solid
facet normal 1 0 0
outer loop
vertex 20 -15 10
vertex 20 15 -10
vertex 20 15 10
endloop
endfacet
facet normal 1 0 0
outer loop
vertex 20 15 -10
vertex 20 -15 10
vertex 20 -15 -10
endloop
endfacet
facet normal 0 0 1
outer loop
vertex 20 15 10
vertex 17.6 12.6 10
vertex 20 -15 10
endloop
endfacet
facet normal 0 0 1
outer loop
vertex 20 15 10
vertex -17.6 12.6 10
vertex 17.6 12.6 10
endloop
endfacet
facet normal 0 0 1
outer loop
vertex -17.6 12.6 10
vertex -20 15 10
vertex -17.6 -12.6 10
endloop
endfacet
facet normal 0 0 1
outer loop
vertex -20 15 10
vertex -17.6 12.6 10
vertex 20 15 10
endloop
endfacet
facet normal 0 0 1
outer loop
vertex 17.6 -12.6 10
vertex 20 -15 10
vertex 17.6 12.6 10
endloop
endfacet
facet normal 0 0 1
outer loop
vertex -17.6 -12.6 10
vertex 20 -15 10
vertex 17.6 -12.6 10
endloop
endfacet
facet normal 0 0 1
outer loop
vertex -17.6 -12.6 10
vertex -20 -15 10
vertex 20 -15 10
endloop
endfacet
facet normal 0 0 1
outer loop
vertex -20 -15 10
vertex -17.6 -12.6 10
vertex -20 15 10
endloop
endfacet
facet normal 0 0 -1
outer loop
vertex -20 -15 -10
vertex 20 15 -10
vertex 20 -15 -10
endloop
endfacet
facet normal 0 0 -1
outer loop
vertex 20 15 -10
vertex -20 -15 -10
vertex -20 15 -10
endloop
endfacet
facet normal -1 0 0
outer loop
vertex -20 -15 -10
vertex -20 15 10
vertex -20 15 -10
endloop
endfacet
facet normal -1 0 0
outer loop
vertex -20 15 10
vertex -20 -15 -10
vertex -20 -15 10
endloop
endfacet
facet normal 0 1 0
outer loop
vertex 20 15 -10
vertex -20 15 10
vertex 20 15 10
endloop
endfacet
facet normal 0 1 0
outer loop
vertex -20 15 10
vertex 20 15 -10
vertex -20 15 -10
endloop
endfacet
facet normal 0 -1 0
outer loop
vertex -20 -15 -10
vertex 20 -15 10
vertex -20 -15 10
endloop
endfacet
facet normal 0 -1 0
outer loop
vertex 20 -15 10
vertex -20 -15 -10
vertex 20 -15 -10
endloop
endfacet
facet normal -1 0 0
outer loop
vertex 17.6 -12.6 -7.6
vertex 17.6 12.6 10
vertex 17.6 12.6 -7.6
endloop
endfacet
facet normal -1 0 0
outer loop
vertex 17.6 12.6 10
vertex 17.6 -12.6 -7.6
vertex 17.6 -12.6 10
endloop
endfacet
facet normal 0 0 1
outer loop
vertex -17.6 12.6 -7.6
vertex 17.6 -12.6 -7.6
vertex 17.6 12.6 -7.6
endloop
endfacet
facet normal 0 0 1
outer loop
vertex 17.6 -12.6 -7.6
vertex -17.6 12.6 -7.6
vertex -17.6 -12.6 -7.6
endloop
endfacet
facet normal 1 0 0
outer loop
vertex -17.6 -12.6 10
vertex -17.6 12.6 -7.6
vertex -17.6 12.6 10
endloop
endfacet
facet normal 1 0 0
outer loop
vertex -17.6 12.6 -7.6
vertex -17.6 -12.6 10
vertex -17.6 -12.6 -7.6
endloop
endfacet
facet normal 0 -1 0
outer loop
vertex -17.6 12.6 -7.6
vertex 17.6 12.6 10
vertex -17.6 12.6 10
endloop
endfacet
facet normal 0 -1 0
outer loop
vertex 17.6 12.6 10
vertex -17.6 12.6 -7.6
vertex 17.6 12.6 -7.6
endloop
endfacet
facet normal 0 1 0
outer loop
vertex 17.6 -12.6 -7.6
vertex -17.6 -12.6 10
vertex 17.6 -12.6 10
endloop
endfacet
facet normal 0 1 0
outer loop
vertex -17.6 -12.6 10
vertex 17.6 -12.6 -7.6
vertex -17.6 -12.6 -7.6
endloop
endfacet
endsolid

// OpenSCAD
// file: ../../lib/std.scad
// lib/std.scad — utilitaires partagés par tous les modèles.
// Unités : millimètres. Convention : chaque modèle définit `module main()`.

// Résolution des courbes : basse en preview, fine au rendu final.
// $fa = 3 donne 120 segments sur un Ø 69, soit 0,04 mm d'erreur de corde :
// très en deçà de ce qu'une buse de 0,4 mm sait reproduire.
$fs = $preview ? 0.8 : 0.3;
$fa = $preview ? 9   : 3;

EPS = 0.01;   // pour éviter les faces coplanaires dans les difference()
BIG = 1000;   // demi-espace de coupe, largement plus grand que les modèles

// Coupe en demi-espace : supprime la matière au-delà de `at` le long de `axis`.
//   axis : "x" | "y" | "z"
//   keep : "neg" garde le côté < at, "pos" garde le côté > at
module section(axis = "x", at = 0, keep = "neg") {
    s = (keep == "neg") ? 1 : -1;
    difference() {
        children();
        translate(
            axis == "x" ? [at + s * BIG / 2, 0, 0] :
            axis == "y" ? [0, at + s * BIG / 2, 0] :
                          [0, 0, at + s * BIG / 2]
        ) cube(BIG, center = true);
    }
}

// Coupe de quart (deux plans) — très lisible pour montrer l'intérieur d'une pièce.
module quarter_cut(x = 0, y = 0) {
    section("x", x, "neg") section("y", y, "neg") children();
}

// Tranche 2D : intersection du modèle avec un plan perpendiculaire à `axis`.
module slice_2d(axis = "z", at = 0) {
    projection(cut = true)
        rotate(axis == "x" ? [0, 90, 0] : axis == "y" ? [-90, 0, 0] : [0, 0, 0])
        translate(axis == "x" ? [-at, 0, 0] : axis == "y" ? [0, -at, 0] : [0, 0, -at])
        children();
}

// Vue technique 2D : silhouette projetée (front / top / right / left / back / bottom).
module view_2d(view = "front") {
    projection(cut = false)
        rotate(
            view == "front"  ? [-90, 0,   0] :
            view == "back"   ? [-90, 0, 180] :
            view == "right"  ? [-90, 0, -90] :
            view == "left"   ? [-90, 0,  90] :
            view == "bottom" ? [180, 0,   0] :
                               [  0, 0,   0]   // top
        ) children();
}
// main file
// _template — point de départ pour un nouveau modèle.
// Copier le répertoire, le renommer <slug>, renommer ce fichier <slug>.scad.

include <../../lib/std.scad>

// --- Paramètres -------------------------------------------------------------

largeur   = 40;   // mm
profondeur = 30;  // mm
hauteur   = 20;   // mm
paroi     = 2.4;  // mm — 3 périmètres à 0.4 mm de buse
jeu       = 0.3;  // mm — jeu fonctionnel des ajustements glissants

// --- Géométrie --------------------------------------------------------------

module main() {
    difference() {
        cube([largeur, profondeur, hauteur], center = true);
        translate([0, 0, paroi])
            cube([largeur - 2 * paroi, profondeur - 2 * paroi, hauteur], center = true);
    }
}

main();
